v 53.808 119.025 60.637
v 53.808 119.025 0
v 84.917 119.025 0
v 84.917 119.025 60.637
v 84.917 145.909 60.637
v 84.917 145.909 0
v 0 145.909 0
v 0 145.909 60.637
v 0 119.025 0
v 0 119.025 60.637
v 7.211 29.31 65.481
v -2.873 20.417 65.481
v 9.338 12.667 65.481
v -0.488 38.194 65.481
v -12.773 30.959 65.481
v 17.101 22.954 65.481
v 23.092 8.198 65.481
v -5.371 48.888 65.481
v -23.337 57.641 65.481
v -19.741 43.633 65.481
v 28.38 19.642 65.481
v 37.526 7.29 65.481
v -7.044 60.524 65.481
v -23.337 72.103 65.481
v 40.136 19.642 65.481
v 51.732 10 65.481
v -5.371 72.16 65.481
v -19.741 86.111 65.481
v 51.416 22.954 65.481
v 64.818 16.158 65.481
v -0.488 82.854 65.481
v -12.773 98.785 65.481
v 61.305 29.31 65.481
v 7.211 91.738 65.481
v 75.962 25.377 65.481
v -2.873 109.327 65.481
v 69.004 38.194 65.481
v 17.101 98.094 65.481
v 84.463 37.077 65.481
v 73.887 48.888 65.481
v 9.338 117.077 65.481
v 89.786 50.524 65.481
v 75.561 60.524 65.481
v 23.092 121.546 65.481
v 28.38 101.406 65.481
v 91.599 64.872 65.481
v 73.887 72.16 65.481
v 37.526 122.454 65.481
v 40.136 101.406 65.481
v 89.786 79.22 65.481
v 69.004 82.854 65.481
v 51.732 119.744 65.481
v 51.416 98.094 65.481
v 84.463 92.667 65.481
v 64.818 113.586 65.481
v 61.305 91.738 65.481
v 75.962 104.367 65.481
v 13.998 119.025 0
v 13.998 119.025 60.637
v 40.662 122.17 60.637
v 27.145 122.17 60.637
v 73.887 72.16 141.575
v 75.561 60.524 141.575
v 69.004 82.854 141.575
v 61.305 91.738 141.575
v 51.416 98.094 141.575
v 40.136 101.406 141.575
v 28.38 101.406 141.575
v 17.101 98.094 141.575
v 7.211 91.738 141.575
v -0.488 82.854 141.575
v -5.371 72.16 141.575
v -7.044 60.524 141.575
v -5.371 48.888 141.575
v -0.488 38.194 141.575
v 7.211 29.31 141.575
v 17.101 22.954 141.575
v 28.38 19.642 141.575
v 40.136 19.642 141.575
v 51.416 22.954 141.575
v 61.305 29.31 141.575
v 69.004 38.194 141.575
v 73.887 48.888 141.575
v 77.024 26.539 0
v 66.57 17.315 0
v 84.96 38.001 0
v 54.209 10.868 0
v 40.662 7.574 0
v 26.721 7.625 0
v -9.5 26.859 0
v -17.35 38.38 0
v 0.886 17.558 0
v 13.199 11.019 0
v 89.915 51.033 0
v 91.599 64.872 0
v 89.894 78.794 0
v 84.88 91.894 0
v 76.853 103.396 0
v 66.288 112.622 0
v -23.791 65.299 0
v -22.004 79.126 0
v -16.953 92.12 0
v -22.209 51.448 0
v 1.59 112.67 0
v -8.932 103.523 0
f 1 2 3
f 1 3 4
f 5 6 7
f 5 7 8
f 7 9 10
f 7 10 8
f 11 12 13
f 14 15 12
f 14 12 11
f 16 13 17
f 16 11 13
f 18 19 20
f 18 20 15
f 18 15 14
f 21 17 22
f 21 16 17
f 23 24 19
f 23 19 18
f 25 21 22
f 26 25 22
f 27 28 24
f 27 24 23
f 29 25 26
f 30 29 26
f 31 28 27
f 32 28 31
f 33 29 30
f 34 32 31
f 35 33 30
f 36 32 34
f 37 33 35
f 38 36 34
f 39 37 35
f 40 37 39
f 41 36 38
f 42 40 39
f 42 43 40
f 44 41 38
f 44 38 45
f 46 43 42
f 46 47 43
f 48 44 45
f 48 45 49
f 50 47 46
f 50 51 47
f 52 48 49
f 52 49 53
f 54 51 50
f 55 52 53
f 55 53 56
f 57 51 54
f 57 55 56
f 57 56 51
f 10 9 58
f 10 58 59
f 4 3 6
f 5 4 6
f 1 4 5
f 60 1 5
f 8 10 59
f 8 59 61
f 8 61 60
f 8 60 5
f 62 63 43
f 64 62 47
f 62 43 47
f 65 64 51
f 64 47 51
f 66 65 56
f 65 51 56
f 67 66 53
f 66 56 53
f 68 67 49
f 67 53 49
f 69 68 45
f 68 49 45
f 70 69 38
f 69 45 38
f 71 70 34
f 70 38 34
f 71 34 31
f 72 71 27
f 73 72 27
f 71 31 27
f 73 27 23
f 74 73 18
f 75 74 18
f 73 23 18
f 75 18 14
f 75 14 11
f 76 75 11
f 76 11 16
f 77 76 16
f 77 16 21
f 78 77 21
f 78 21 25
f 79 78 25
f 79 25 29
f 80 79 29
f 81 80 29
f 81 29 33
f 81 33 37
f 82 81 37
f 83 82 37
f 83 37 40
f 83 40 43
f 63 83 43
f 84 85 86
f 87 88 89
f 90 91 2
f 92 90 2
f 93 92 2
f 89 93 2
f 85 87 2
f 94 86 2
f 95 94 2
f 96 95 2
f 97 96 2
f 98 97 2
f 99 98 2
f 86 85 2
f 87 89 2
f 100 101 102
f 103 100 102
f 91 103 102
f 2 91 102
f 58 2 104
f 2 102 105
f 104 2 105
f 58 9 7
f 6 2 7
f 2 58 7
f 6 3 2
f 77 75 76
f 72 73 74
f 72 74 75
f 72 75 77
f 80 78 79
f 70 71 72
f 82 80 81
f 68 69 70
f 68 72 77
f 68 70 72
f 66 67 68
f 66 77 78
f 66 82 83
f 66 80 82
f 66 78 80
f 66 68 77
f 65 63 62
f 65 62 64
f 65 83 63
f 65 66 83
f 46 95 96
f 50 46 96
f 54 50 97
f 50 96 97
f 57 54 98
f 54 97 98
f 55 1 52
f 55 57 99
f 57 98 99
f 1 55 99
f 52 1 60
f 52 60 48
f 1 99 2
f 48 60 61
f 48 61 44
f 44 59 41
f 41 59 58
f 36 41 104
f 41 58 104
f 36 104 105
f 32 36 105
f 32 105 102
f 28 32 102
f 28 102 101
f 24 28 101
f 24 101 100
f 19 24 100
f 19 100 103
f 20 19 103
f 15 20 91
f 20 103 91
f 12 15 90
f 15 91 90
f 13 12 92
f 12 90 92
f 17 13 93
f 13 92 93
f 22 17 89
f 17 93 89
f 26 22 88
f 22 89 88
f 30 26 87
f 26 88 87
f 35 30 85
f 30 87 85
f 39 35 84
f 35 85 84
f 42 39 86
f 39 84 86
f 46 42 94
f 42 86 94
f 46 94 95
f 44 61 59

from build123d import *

# Parameters (mm, degrees)
F0_R     = 57.695631
F1_DEPTH = 65.480502
F2_R     = 41.302375
F3_DEPTH = 141.575145
F4_W     = 26.883833
F4_H     = 60.637102
F5_DEPTH = 84.917324


with BuildPart() as f1:
    # F0 (on Top) → F1 (new body)
    with BuildSketch(Plane.XY):
        with Locations((33.90348, 64.872049)):
            Circle(F0_R)
    extrude(amount=F1_DEPTH)

    # F2 (on Top) → F3 (join)
    with BuildSketch(Plane.XY):
        with Locations((34.258131, 60.523979)):
            Circle(F2_R)
    extrude(amount=F3_DEPTH)

    # F4 (on Right) → F5 (join)
    with BuildSketch(Plane.YZ):
        with Locations((132.467243, 30.318551)):
            Rectangle(F4_W, F4_H)
    extrude(amount=F5_DEPTH)


solid = f1.part
